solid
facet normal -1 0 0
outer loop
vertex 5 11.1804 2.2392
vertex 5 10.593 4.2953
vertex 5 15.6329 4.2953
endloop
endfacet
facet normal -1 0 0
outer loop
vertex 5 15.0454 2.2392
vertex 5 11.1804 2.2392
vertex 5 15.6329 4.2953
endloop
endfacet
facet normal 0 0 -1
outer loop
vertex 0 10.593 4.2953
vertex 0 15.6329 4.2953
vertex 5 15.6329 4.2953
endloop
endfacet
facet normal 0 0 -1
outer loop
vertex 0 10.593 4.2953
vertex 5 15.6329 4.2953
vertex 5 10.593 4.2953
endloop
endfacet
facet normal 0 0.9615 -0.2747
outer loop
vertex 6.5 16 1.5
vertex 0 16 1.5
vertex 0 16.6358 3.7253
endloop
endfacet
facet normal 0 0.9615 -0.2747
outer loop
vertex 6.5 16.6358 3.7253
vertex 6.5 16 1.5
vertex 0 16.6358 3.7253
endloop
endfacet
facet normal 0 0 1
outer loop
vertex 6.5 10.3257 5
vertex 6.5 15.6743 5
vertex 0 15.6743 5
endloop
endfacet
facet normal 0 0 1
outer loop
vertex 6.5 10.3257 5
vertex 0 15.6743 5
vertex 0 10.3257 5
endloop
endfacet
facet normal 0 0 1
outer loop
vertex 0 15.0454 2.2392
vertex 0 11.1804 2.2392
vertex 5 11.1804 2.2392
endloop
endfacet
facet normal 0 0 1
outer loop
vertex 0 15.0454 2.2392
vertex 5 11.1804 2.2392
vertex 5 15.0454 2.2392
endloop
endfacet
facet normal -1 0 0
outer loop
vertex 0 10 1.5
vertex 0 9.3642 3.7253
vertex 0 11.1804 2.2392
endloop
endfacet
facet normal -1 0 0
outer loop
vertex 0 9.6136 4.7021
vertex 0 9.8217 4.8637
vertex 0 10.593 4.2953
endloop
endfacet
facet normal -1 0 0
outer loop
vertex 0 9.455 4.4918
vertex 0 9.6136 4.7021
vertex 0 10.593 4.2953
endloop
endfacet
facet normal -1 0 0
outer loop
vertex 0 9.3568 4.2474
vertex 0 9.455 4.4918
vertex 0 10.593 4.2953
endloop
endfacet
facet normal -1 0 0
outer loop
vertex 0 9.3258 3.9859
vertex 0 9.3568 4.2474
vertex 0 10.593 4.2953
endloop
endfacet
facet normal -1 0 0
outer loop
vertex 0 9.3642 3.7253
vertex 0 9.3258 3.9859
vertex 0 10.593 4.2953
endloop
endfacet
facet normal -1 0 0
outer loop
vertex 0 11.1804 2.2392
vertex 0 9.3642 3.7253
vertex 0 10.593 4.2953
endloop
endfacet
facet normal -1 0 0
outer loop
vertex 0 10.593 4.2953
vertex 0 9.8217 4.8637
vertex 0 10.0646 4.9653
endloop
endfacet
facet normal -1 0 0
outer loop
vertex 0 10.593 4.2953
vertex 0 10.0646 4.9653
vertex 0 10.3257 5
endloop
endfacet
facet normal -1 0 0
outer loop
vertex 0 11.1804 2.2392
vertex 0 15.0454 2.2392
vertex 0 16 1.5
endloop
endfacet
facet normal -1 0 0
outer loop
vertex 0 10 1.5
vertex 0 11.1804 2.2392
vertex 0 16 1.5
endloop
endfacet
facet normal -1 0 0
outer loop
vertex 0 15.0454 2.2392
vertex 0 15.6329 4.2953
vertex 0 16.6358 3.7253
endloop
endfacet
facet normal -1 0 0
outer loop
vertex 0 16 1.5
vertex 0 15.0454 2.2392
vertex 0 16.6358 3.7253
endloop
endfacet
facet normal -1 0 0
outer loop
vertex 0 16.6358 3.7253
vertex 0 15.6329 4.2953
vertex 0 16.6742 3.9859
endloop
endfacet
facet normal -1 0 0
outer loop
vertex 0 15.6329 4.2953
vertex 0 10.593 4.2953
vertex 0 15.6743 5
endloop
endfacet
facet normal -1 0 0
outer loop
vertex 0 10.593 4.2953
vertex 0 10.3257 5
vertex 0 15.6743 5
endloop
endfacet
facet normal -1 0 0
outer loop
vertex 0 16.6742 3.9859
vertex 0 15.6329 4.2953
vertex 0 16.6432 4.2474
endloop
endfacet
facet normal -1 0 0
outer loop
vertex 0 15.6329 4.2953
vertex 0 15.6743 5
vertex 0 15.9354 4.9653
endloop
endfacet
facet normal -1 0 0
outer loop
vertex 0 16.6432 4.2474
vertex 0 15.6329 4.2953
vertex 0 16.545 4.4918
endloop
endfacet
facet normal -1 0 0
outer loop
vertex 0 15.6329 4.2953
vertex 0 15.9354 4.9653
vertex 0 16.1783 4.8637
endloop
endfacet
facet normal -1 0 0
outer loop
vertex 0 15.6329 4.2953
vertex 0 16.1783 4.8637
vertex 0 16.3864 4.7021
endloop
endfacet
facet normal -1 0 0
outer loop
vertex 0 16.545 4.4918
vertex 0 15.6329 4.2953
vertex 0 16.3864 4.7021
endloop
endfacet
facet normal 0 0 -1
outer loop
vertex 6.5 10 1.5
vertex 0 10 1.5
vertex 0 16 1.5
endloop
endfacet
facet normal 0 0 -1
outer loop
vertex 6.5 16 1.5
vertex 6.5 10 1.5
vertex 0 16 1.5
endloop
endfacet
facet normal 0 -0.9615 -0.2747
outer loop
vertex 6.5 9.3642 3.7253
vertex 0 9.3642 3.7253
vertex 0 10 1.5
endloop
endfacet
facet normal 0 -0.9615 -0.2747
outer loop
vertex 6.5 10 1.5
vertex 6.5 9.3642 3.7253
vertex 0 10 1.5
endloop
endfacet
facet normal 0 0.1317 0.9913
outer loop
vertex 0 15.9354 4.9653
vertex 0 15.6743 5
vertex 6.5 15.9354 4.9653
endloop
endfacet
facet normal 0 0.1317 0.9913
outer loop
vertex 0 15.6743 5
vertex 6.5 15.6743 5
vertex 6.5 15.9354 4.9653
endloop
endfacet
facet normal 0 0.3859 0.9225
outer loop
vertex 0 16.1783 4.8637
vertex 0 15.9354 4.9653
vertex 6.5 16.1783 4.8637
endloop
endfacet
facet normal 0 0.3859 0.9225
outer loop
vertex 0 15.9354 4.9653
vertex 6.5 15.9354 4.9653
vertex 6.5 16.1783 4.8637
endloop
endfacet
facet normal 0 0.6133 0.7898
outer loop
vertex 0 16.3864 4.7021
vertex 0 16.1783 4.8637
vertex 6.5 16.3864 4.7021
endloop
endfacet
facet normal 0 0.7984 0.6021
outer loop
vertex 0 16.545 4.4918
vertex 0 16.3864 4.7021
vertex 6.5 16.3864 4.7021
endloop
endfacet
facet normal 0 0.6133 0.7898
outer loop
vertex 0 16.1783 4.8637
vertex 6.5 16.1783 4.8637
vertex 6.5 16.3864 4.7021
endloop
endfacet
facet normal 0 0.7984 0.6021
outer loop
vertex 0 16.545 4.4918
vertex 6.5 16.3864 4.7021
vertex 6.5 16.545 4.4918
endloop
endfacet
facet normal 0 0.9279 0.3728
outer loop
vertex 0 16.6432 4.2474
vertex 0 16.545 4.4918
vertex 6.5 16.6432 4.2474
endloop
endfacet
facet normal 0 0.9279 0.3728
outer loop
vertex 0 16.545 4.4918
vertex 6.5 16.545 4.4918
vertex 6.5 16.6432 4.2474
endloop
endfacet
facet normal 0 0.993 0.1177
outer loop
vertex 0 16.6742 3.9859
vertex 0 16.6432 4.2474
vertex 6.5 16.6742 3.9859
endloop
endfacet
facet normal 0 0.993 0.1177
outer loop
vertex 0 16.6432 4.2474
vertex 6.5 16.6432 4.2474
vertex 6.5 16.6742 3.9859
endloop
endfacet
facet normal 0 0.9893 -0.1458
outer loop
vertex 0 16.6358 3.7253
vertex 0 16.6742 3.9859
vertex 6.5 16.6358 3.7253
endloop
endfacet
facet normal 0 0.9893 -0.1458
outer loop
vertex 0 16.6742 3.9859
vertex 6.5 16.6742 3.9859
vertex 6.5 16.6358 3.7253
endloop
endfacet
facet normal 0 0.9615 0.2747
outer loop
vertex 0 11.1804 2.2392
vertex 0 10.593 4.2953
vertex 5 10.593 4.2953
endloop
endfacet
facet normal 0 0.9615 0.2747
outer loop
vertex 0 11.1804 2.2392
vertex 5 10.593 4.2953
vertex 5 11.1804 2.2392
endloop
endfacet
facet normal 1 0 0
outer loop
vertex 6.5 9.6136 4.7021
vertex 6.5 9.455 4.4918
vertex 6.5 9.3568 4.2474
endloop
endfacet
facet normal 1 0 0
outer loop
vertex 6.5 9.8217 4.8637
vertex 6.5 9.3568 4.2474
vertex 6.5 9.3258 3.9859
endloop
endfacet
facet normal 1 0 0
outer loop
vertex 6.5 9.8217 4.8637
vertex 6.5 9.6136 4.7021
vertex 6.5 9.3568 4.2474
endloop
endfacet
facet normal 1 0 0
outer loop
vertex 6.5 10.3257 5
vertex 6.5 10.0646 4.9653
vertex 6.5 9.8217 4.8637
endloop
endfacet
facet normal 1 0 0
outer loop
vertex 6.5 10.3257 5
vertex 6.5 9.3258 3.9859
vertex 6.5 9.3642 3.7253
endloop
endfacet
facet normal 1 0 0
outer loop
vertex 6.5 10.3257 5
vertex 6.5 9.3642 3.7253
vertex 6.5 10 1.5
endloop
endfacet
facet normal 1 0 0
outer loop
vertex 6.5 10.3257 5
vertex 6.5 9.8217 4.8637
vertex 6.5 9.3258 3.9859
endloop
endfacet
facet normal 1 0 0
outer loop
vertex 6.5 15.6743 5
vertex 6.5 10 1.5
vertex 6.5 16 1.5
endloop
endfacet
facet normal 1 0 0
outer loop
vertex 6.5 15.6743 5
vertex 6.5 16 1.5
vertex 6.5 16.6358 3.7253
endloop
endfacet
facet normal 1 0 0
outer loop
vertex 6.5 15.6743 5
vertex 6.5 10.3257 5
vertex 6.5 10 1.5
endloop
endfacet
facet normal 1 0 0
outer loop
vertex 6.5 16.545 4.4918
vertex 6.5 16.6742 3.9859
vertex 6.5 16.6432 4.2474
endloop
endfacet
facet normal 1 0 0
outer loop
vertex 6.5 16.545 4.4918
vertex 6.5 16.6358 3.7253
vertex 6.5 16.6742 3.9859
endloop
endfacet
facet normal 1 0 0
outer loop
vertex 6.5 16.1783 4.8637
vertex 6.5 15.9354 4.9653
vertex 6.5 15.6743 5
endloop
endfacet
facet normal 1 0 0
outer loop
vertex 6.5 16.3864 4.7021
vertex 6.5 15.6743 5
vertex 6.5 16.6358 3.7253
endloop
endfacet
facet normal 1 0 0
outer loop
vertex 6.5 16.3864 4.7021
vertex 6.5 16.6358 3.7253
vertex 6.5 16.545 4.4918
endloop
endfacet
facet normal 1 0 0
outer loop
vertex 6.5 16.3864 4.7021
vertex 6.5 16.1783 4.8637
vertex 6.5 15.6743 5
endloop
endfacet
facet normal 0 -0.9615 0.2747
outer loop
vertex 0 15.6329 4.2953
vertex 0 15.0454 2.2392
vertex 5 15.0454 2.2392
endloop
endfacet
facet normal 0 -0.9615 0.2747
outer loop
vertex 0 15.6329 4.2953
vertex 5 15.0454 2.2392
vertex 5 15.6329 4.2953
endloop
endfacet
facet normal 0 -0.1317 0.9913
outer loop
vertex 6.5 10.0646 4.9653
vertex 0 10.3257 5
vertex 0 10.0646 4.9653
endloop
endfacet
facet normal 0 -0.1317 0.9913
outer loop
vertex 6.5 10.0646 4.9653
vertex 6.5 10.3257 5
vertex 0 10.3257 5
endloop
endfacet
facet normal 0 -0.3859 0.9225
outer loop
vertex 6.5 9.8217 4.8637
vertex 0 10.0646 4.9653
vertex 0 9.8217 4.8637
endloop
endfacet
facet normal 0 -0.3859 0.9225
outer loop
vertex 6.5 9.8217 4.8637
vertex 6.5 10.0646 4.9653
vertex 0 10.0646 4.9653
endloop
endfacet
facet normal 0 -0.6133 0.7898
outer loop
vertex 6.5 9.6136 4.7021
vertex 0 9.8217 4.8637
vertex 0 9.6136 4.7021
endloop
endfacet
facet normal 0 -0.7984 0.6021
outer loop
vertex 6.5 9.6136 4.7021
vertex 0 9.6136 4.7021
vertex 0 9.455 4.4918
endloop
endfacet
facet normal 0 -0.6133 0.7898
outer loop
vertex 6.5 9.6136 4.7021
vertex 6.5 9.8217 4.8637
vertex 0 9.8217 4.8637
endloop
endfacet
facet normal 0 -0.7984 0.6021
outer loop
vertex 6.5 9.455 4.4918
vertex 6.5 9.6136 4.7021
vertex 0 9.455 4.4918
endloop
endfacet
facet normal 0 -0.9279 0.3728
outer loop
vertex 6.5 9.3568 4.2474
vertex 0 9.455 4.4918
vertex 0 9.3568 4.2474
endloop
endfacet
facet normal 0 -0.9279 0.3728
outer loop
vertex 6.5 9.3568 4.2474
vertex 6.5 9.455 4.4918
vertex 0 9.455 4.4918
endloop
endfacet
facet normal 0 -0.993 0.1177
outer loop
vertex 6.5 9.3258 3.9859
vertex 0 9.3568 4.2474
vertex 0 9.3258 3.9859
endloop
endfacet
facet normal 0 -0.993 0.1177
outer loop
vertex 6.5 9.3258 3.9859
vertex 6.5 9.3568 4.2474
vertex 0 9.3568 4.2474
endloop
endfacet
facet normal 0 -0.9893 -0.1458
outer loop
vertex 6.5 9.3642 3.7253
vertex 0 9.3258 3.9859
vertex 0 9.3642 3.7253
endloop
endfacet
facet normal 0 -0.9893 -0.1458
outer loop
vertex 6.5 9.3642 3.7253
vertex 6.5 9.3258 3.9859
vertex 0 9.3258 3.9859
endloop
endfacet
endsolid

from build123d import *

# Parameters (mm, degrees)
EXTRUDE_SKETCH003_DEPTH = 6.5
POCKET001_DEPTH         = 5
FILLET002_R             = 1


with BuildPart() as part:
    # Sketch003 → Extrude_Sketch003 (new body)
    with BuildSketch(Plane(origin=(0, 0, 0), x_dir=(0, -1, 0), z_dir=(-1, 0, 0))):
        Polygon((-17, 5), (-9, 5), (-10, 1.5), (-16, 1.5), align=None)
    extrude(amount=-EXTRUDE_SKETCH003_DEPTH)

    # Sketch004 → Pocket001 (cut)
    with BuildSketch(Plane(origin=(0, 0, 0), x_dir=(0, -1, 0), z_dir=(-1, 0, 0))):
        Polygon((-15.632888, 4.295265), (-10.592995, 4.295265), (-11.18045, 2.239173), (-15.045433, 2.239173), align=None)
    extrude(amount=-POCKET001_DEPTH, mode=Mode.SUBTRACT)

    # Fillet002
    fillet002_edges = [part.edges().sort_by_distance(p)[0] for p in [
        (3.25, 17, 5),
        (3.25, 9, 5),
    ]]
    fillet(fillet002_edges, radius=FILLET002_R)


solid = part.part
